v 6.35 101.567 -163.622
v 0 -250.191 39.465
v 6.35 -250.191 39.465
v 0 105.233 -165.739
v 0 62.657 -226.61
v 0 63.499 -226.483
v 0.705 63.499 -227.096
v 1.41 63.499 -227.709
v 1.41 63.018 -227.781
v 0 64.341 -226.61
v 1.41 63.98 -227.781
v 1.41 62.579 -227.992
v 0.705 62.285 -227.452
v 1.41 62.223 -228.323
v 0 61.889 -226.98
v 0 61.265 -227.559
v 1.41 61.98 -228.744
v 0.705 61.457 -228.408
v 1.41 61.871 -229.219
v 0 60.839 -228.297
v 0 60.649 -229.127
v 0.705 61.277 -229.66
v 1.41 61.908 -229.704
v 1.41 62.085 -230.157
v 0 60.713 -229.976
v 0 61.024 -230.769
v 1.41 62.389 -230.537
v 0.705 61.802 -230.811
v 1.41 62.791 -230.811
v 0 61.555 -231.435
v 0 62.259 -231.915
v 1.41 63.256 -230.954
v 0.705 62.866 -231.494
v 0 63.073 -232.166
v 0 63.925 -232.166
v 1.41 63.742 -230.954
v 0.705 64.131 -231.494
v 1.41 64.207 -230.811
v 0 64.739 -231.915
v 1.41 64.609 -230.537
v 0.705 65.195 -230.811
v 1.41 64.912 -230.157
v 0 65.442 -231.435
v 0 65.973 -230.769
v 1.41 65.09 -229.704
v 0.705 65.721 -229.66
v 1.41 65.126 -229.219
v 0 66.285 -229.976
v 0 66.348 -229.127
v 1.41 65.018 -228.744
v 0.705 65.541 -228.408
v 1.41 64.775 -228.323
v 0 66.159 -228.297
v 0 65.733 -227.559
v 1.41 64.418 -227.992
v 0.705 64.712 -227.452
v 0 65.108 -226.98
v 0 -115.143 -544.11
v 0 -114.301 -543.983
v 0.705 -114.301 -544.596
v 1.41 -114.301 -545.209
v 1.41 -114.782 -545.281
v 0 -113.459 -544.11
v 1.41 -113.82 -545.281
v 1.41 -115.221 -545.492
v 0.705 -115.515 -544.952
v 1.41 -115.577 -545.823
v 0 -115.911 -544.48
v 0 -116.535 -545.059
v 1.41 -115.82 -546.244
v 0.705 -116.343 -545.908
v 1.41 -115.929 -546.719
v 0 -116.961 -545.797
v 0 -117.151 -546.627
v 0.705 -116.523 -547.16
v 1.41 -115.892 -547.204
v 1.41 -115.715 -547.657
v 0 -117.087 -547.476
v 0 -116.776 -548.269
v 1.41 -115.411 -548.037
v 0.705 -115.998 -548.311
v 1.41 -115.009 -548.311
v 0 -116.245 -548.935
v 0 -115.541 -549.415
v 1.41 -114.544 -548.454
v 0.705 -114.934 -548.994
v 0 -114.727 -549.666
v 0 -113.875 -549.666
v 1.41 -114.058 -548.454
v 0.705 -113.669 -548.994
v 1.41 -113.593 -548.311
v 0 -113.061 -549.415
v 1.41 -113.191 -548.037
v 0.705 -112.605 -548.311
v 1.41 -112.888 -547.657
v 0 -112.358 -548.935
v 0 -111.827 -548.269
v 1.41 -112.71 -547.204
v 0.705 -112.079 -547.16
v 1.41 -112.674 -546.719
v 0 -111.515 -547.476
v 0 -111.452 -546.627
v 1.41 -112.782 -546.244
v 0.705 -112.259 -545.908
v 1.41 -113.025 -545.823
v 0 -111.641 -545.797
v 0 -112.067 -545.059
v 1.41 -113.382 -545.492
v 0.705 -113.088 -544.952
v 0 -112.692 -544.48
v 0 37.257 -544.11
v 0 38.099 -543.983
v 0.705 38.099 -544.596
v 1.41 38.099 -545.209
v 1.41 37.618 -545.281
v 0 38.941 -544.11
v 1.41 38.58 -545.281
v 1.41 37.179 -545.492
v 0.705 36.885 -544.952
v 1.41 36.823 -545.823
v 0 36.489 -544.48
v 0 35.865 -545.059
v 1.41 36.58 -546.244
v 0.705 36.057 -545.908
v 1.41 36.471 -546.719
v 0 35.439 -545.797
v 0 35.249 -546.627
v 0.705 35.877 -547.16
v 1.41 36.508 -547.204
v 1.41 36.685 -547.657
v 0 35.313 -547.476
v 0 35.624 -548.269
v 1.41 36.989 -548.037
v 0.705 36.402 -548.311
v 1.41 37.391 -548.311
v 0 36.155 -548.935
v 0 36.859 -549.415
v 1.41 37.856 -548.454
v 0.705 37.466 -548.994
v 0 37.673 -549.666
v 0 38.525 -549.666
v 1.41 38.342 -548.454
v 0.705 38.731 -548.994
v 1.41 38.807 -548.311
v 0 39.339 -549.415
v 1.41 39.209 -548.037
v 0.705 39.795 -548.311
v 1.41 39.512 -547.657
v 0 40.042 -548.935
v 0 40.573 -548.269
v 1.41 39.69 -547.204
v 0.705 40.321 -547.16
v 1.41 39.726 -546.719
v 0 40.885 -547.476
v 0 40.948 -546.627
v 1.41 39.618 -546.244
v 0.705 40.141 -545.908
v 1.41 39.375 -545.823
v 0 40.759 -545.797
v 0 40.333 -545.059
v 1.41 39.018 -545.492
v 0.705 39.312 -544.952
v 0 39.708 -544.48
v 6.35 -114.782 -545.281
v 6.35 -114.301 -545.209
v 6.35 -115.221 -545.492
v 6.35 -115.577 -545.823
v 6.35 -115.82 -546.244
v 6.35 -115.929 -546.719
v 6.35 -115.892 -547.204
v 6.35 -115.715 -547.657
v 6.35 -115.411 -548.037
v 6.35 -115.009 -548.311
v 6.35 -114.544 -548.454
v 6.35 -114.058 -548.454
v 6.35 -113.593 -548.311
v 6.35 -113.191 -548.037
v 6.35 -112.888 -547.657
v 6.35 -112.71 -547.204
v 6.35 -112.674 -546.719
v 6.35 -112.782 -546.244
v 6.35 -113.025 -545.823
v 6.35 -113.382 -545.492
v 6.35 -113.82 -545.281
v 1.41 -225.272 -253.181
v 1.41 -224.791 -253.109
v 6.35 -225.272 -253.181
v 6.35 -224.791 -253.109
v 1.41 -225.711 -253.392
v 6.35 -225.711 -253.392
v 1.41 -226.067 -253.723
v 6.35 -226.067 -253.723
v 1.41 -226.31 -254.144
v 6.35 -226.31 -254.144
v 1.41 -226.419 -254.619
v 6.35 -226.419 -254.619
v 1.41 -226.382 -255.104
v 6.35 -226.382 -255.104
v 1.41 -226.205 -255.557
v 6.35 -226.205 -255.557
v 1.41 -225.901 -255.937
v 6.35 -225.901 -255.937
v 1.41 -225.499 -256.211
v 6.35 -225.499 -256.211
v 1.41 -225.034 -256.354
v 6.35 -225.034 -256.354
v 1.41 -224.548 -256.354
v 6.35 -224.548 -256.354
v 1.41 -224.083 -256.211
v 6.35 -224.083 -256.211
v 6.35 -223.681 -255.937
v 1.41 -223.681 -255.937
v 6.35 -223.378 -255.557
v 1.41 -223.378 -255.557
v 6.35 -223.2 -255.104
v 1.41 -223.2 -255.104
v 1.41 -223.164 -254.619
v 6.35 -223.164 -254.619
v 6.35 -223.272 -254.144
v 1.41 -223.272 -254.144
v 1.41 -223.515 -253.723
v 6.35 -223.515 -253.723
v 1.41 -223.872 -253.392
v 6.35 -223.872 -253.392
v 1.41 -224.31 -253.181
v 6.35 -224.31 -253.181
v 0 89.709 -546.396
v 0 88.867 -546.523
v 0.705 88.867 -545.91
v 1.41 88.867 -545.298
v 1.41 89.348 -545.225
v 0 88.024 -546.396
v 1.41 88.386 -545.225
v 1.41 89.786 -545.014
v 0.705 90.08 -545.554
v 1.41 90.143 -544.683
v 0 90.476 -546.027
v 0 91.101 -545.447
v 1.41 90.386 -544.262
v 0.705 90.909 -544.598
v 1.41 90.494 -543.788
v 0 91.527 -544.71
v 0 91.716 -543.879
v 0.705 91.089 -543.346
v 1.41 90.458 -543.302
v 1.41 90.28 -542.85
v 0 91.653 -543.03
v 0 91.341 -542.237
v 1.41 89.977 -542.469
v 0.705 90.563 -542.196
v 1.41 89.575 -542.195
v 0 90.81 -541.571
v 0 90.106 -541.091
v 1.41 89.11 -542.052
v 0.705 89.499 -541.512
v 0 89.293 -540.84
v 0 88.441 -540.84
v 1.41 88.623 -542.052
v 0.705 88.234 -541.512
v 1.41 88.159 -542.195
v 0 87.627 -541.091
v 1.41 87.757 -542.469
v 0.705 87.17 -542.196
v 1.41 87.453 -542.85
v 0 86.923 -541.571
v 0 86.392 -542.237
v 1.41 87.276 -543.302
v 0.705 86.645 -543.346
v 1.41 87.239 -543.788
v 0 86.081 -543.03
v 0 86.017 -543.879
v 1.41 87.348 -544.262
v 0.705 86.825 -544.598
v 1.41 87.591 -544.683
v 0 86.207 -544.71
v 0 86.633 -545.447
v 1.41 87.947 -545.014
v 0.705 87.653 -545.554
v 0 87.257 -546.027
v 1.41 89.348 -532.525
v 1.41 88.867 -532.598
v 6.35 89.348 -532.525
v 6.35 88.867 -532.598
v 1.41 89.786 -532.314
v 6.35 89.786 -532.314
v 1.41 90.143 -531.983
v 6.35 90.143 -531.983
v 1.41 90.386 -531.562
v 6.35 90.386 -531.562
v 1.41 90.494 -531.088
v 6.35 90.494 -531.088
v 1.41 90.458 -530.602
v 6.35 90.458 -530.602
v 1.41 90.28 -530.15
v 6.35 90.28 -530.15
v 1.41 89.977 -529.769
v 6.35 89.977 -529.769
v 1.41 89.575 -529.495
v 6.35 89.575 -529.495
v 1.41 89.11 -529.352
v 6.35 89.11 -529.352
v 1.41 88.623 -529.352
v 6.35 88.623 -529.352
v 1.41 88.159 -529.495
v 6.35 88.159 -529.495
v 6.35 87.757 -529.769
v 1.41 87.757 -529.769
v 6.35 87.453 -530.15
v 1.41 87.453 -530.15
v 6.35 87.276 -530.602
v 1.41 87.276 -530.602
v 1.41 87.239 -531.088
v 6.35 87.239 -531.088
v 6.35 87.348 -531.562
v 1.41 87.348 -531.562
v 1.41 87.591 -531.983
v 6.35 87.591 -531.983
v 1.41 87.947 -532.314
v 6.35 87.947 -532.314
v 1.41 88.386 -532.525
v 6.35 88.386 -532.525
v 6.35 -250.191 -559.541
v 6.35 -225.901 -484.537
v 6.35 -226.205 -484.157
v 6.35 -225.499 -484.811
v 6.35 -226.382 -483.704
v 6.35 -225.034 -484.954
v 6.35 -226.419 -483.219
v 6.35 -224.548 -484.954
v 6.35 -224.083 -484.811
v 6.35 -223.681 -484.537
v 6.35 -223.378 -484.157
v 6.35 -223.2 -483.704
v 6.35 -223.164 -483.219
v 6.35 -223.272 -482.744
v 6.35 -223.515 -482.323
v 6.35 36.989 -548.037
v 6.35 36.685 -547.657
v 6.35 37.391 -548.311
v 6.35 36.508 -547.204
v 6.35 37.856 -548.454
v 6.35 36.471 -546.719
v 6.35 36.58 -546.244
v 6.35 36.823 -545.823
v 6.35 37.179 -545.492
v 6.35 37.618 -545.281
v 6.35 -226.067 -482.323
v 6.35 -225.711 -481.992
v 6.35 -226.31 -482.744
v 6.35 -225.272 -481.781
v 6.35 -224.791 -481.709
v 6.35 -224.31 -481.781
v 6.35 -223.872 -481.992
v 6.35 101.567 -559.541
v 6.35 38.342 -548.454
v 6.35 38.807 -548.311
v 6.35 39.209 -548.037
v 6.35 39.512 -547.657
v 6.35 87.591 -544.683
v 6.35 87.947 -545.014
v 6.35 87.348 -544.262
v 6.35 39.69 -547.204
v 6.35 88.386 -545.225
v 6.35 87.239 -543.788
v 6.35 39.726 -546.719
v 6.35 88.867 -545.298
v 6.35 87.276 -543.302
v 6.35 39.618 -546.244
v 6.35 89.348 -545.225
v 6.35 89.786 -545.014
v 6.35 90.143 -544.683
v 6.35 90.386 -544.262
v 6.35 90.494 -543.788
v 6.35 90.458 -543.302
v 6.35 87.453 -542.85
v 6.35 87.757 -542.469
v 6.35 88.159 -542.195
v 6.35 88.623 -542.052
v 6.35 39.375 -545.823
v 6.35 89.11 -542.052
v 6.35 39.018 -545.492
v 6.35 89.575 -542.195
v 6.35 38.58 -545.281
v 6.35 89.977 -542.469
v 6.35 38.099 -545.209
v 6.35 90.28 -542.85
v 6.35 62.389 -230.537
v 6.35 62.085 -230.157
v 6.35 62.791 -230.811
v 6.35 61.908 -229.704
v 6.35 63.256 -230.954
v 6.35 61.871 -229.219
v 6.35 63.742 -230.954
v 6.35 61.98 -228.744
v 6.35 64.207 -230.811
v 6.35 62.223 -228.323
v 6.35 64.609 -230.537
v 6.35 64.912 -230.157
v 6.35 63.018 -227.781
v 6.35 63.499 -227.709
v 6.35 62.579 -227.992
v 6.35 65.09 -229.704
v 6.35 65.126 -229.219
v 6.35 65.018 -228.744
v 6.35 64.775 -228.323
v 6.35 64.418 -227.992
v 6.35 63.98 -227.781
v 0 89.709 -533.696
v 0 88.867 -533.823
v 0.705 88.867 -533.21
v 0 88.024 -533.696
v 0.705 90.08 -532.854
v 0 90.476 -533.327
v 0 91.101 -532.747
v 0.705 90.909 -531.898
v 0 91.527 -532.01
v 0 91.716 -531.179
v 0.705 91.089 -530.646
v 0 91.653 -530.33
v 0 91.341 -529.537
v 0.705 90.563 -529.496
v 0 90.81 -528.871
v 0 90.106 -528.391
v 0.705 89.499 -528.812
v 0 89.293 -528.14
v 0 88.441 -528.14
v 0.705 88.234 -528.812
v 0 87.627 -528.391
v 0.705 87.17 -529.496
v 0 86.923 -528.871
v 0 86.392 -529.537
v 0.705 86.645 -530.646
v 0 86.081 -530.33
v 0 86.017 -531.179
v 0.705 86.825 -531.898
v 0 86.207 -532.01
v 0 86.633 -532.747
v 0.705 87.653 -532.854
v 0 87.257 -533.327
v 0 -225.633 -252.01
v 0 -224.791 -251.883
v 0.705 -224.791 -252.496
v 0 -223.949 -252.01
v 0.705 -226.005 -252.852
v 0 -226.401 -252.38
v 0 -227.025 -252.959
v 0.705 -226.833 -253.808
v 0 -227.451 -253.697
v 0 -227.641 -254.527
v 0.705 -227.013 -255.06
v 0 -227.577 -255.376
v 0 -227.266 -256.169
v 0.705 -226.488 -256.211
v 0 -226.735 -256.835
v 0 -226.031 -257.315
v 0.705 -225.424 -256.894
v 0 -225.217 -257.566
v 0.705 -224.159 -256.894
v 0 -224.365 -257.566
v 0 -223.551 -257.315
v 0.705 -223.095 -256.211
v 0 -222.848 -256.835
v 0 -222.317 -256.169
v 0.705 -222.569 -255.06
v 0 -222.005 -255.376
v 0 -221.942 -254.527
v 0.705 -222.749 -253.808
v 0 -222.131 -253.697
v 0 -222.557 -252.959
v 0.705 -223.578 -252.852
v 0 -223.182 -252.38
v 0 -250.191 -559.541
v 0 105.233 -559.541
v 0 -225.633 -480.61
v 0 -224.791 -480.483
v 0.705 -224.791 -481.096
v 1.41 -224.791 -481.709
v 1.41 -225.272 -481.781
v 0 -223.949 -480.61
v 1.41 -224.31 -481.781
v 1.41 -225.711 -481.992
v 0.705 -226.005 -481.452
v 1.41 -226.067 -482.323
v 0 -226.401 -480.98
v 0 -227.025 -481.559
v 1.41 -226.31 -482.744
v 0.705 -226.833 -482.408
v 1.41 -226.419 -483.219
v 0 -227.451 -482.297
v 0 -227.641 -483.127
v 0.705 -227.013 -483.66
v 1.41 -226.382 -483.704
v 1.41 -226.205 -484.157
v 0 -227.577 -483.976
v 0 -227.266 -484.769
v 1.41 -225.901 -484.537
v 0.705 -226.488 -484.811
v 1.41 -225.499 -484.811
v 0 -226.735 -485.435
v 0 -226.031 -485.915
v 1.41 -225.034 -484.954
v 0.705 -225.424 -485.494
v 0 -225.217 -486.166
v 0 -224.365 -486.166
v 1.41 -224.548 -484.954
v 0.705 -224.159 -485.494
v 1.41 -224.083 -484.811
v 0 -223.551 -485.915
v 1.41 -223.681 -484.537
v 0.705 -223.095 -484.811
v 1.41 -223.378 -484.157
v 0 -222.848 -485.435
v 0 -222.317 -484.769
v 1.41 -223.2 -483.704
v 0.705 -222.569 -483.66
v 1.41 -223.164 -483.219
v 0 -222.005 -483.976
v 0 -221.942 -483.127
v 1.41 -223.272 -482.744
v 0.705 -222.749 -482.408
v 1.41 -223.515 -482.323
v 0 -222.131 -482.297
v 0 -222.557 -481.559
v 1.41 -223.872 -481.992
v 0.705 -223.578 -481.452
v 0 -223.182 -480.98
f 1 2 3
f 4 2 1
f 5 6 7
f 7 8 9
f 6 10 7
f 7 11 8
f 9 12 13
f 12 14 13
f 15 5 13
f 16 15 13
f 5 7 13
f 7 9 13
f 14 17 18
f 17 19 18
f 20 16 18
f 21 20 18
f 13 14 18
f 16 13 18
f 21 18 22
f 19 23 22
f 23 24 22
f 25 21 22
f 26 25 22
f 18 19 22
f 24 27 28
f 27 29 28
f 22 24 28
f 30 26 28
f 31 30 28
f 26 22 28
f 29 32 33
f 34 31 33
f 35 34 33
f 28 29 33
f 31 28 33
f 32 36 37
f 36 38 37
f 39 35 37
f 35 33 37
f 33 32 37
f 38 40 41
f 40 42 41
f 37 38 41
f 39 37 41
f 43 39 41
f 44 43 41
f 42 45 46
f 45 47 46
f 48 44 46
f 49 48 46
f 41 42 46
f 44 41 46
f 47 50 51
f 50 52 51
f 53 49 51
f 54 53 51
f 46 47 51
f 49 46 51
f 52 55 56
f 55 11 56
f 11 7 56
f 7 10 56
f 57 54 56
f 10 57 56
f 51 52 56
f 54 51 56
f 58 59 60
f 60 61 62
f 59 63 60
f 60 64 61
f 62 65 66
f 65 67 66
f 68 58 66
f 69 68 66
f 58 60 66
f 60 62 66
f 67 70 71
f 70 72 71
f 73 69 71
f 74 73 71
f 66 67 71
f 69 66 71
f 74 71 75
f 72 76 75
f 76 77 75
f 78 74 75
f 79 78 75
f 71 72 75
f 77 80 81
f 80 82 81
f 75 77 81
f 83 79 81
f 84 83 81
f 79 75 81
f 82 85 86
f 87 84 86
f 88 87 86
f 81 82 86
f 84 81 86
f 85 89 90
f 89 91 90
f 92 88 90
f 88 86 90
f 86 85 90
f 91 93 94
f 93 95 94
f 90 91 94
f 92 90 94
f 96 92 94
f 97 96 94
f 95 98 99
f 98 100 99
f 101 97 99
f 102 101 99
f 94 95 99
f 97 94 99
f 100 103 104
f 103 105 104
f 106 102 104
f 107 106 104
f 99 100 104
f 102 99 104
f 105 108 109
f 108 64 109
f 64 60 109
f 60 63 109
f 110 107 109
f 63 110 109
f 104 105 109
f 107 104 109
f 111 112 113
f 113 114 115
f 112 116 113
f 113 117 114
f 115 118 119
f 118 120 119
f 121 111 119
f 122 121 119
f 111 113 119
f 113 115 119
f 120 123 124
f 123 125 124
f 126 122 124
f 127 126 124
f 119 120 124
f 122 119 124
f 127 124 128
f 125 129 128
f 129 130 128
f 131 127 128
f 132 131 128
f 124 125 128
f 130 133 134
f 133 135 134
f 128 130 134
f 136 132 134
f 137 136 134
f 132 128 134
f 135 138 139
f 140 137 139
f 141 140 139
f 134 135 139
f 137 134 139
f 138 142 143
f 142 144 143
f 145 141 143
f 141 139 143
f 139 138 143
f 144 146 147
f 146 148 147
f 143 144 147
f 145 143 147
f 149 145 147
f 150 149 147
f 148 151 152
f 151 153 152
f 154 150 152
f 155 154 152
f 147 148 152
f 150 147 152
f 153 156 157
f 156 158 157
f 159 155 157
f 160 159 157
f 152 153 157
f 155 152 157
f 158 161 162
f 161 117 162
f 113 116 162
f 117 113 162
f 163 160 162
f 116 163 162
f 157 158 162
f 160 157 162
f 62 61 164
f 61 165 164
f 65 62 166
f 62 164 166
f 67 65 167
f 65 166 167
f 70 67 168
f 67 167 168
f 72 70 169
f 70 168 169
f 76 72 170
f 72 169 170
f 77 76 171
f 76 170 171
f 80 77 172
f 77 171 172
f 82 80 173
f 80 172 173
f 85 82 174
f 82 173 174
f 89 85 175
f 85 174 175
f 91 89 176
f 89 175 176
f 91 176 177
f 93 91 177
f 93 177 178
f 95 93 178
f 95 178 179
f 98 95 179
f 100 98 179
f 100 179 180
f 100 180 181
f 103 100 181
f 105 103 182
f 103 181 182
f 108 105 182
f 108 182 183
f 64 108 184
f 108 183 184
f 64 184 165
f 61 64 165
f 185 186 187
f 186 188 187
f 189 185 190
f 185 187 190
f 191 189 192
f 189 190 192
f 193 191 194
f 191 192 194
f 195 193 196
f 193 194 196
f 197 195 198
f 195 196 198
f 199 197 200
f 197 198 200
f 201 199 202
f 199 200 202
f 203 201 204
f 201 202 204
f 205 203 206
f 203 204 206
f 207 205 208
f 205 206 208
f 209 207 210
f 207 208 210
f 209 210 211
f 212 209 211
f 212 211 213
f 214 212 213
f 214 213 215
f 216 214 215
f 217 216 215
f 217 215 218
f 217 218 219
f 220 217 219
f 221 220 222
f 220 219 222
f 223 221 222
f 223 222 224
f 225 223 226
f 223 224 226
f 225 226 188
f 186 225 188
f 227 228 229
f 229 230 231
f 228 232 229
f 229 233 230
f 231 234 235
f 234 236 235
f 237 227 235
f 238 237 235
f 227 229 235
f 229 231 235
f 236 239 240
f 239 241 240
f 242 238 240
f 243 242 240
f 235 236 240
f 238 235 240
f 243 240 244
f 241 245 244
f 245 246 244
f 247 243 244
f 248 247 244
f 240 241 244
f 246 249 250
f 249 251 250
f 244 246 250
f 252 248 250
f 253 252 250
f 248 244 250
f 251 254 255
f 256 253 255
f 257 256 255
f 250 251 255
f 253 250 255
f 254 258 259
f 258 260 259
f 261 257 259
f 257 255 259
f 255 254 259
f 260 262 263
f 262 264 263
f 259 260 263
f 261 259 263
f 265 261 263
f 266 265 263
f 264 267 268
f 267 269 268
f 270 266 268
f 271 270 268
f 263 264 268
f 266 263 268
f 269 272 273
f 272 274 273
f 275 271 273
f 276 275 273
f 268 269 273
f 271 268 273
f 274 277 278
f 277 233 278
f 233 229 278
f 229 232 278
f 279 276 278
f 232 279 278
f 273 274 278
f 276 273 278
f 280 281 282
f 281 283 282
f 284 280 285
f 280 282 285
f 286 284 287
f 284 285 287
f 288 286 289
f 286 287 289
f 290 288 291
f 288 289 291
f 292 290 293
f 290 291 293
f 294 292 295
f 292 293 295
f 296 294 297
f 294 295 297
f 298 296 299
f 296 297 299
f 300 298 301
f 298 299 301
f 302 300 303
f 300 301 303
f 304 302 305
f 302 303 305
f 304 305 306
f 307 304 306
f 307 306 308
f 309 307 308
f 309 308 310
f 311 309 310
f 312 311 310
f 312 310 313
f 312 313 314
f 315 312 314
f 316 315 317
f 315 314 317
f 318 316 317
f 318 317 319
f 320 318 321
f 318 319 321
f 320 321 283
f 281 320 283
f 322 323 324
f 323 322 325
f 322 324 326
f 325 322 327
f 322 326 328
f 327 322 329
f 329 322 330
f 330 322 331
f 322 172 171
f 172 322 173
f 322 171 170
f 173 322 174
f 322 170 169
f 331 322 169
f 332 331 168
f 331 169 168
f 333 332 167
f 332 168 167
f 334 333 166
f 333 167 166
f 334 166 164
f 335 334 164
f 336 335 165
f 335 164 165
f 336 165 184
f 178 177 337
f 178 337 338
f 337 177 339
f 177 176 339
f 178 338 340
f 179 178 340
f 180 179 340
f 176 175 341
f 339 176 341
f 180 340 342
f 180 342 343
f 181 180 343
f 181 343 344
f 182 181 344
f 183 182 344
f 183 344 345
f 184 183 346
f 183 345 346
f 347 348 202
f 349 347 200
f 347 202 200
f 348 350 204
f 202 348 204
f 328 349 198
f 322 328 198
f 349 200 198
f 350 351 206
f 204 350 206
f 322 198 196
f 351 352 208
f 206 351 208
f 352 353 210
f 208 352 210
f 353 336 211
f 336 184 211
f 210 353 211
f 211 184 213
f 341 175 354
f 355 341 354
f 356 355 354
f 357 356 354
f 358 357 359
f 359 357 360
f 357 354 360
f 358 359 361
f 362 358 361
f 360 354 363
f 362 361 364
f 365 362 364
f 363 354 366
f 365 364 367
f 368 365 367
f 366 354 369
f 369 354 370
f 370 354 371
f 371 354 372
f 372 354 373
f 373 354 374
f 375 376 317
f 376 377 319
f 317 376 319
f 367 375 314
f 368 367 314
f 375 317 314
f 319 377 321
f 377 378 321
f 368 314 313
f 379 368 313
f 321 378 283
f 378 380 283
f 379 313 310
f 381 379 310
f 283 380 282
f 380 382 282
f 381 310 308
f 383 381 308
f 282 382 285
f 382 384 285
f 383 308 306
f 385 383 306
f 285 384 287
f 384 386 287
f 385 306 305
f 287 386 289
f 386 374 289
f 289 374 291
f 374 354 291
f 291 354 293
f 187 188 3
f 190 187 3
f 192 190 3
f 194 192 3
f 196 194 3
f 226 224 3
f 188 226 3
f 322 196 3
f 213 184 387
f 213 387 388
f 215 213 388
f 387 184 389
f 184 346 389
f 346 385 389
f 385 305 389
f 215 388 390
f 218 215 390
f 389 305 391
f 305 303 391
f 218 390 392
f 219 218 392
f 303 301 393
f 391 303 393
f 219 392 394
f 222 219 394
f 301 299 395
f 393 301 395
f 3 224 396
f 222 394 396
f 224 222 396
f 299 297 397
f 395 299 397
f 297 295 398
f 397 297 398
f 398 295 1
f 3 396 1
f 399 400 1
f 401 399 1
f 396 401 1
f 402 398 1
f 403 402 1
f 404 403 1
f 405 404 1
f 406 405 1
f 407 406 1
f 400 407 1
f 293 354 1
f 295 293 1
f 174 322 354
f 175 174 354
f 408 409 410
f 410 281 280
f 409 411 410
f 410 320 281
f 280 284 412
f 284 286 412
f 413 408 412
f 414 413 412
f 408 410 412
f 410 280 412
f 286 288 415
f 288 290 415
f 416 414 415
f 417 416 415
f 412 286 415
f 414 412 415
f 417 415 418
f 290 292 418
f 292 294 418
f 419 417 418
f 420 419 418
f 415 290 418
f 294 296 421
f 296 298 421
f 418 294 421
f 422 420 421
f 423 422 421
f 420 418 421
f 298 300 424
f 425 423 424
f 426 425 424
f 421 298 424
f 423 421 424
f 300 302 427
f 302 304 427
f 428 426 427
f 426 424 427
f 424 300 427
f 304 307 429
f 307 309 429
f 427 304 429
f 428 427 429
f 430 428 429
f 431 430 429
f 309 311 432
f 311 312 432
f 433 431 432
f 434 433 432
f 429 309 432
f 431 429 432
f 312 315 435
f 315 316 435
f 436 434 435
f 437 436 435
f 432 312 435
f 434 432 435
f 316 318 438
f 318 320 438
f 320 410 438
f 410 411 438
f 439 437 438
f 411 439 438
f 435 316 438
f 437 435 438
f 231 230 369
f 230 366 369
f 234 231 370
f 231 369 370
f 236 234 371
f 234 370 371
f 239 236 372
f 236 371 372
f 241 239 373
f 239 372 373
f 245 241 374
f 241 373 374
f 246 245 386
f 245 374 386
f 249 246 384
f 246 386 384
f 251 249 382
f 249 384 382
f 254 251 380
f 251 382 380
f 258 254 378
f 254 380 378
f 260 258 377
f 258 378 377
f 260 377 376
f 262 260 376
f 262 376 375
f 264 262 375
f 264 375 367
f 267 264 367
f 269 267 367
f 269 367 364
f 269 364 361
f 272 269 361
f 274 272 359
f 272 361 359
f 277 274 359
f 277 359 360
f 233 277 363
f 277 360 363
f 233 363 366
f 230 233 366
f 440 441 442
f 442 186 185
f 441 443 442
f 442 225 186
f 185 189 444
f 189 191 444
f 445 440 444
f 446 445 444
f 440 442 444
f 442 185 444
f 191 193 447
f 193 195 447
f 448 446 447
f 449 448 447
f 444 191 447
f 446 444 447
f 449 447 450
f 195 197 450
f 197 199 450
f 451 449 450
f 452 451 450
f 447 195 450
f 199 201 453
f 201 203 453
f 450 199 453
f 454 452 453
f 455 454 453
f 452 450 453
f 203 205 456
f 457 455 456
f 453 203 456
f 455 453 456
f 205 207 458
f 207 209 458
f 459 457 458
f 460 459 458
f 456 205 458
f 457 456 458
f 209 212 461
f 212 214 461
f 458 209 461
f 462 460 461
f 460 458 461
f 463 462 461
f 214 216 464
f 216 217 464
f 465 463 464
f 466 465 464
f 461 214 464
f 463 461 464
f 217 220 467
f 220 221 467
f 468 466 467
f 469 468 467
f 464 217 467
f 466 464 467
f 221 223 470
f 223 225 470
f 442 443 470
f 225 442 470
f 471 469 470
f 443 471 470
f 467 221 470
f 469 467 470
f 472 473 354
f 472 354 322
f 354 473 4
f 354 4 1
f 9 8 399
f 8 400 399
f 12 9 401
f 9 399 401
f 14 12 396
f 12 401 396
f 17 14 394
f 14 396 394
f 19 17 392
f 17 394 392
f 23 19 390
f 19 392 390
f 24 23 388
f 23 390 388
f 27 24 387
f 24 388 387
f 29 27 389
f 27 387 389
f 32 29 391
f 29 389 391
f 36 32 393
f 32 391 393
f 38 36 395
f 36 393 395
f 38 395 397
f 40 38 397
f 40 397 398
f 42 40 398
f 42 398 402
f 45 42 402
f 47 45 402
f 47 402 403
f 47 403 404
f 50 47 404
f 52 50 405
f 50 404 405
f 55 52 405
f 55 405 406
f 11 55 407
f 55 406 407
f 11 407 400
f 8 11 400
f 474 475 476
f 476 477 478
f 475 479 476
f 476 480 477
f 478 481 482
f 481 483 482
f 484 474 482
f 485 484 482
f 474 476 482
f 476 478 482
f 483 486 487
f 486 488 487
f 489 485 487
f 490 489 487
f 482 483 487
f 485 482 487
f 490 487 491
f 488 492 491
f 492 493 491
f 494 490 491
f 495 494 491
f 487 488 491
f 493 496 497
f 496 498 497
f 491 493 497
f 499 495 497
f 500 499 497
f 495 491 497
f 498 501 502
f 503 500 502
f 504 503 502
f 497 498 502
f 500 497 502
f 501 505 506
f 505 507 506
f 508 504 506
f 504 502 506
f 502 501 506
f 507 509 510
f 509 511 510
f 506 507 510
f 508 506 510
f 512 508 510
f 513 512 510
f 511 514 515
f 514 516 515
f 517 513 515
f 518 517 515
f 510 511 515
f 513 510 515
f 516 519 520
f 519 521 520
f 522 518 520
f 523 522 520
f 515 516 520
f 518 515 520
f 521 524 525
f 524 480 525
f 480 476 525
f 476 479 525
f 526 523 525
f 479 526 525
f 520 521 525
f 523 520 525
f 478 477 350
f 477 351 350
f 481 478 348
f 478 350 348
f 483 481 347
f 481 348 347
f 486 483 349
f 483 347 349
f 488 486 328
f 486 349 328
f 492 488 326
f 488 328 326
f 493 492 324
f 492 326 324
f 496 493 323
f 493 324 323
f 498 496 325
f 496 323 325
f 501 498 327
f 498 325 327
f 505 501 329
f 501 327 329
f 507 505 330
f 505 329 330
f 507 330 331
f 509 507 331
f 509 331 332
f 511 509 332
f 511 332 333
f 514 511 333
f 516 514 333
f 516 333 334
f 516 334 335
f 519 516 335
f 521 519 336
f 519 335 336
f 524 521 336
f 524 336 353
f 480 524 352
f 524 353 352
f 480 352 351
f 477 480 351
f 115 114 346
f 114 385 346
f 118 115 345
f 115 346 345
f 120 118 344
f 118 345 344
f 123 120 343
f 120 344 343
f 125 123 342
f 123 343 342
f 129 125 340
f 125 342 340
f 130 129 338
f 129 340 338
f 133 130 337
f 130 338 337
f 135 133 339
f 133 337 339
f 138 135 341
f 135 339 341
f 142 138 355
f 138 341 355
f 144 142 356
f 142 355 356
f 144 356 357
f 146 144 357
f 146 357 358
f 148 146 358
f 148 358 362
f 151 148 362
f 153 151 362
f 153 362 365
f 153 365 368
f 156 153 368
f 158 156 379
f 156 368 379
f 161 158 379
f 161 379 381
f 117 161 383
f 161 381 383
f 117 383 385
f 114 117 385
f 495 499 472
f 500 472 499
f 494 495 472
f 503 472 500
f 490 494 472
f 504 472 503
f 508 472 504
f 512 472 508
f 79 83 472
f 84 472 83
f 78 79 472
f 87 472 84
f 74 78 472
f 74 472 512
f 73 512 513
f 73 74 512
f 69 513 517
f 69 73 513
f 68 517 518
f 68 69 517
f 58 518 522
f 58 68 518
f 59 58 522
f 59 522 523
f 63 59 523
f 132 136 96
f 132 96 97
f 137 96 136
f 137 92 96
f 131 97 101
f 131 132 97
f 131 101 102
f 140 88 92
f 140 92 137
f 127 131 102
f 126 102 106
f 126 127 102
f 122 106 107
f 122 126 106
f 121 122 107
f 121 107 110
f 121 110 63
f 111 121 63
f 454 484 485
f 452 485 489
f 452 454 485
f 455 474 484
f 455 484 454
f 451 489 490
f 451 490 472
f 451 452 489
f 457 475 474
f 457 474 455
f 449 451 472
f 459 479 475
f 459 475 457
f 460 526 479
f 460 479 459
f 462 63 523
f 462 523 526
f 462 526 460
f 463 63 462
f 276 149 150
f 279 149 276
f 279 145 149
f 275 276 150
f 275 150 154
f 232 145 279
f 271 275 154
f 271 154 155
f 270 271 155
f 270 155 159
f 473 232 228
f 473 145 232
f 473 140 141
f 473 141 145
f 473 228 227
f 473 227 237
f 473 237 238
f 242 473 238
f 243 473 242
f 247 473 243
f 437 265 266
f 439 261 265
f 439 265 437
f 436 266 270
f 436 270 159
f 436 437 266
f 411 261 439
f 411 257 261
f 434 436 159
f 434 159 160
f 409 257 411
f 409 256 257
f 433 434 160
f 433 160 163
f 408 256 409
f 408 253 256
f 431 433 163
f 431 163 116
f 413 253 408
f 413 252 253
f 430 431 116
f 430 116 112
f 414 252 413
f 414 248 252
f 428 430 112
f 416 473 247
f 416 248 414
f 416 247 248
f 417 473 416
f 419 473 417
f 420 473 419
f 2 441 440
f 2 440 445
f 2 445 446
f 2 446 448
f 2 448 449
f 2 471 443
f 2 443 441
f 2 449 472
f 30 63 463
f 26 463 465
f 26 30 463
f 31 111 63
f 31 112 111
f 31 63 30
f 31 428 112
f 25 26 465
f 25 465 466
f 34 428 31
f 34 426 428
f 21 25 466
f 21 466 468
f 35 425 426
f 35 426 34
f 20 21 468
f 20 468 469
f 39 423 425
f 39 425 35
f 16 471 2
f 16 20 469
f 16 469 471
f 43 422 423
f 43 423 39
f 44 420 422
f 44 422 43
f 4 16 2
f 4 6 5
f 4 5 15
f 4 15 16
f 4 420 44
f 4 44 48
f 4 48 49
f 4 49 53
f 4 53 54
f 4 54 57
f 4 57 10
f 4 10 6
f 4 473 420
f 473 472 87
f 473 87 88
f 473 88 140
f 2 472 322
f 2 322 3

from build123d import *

# Parameters (mm, degrees)
BOSS_EXTRUDE1_DEPTH                            = 6.35
CHAMFER1_SIZE                                  = 6.6548
CHAMFER1_SIZE_2                                = 3.842150571
CSK_FOR_4_FLAT_HEAD_MACHINE_SCREW1_D           = 3.2639
CSK_FOR_4_FLAT_HEAD_MACHINE_SCREW1_CSINK_D     = 5.715
CSK_FOR_4_FLAT_HEAD_MACHINE_SCREW1_CSINK_ANGLE = 82
CSK_FOR_4_FLAT_HEAD_MACHINE_SCREW2_D           = 3.2639
CSK_FOR_4_FLAT_HEAD_MACHINE_SCREW2_CSINK_D     = 5.715
CSK_FOR_4_FLAT_HEAD_MACHINE_SCREW2_CSINK_ANGLE = 82
CSK_FOR_4_FLAT_HEAD_MACHINE_SCREW3_D           = 3.2639
CSK_FOR_4_FLAT_HEAD_MACHINE_SCREW3_CSINK_D     = 5.715
CSK_FOR_4_FLAT_HEAD_MACHINE_SCREW3_CSINK_ANGLE = 82


with BuildPart() as part:
    # Sketch1 → Boss-Extrude1 (new body)
    with BuildSketch(Plane(origin=(0, 0, 0), x_dir=(0, 0, -1), z_dir=(1, 0, 0))):
        Polygon((-39.465115344, -250.191197903), (165.84064038, 105.408802097), (559.54064038, 105.408802097), (559.54064038, -250.191197903), align=None)
    extrude(amount=BOSS_EXTRUDE1_DEPTH)

    # Chamfer1
    # the kernel refuses this chamfer: 6.6548, 3.842150571 mm, written as the material it takes off along each edge
    with BuildSketch(Plane(origin=(6.35, 105.408802097, -148.6241021), x_dir=(-0.9998132206222078, 0.019326765612699946, 0), z_dir=(0, 0, -1))) as chamfer1_piece_1:
        Polygon((CHAMFER1_SIZE * 0.999813220622, -CHAMFER1_SIZE * 0.0193267656127), (-CHAMFER1_SIZE_2 * 0.0193267656147, -CHAMFER1_SIZE_2 * 0.999813220727), (0, 0), align=None)
    extrude(amount=428.13307656, mode=Mode.SUBTRACT)

    # CSK for #4 Flat Head Machine Screw1 (through all)
    with Locations(Plane(origin=(0, 38.098802097, -546.84064038), x_dir=(0, 0, -1), z_dir=(-1, 0, 0))):
        with Locations((0, 0), (-317.5, -25.4), (0, 152.4)):
            CounterSinkHole(CSK_FOR_4_FLAT_HEAD_MACHINE_SCREW1_D / 2, CSK_FOR_4_FLAT_HEAD_MACHINE_SCREW1_CSINK_D / 2, counter_sink_angle=CSK_FOR_4_FLAT_HEAD_MACHINE_SCREW1_CSINK_ANGLE)

    # CSK for #4 Flat Head Machine Screw2 (through all)
    with Locations(Plane.ZY):
        with Locations((-543.66564038, 88.866651525), (-530.96564038, 88.866651525)):
            CounterSinkHole(CSK_FOR_4_FLAT_HEAD_MACHINE_SCREW2_D / 2, CSK_FOR_4_FLAT_HEAD_MACHINE_SCREW2_CSINK_D / 2, counter_sink_angle=CSK_FOR_4_FLAT_HEAD_MACHINE_SCREW2_CSINK_ANGLE)

    # CSK for #4 Flat Head Machine Screw3 (through all)
    with Locations(Plane(origin=(0, -224.791197903, -483.34064038), x_dir=(0, 0, -1), z_dir=(-1, 0, 0))):
        with Locations((0, 0), (-228.6, 0)):
            CounterSinkHole(CSK_FOR_4_FLAT_HEAD_MACHINE_SCREW3_D / 2, CSK_FOR_4_FLAT_HEAD_MACHINE_SCREW3_CSINK_D / 2, counter_sink_angle=CSK_FOR_4_FLAT_HEAD_MACHINE_SCREW3_CSINK_ANGLE)


solid = part.part
